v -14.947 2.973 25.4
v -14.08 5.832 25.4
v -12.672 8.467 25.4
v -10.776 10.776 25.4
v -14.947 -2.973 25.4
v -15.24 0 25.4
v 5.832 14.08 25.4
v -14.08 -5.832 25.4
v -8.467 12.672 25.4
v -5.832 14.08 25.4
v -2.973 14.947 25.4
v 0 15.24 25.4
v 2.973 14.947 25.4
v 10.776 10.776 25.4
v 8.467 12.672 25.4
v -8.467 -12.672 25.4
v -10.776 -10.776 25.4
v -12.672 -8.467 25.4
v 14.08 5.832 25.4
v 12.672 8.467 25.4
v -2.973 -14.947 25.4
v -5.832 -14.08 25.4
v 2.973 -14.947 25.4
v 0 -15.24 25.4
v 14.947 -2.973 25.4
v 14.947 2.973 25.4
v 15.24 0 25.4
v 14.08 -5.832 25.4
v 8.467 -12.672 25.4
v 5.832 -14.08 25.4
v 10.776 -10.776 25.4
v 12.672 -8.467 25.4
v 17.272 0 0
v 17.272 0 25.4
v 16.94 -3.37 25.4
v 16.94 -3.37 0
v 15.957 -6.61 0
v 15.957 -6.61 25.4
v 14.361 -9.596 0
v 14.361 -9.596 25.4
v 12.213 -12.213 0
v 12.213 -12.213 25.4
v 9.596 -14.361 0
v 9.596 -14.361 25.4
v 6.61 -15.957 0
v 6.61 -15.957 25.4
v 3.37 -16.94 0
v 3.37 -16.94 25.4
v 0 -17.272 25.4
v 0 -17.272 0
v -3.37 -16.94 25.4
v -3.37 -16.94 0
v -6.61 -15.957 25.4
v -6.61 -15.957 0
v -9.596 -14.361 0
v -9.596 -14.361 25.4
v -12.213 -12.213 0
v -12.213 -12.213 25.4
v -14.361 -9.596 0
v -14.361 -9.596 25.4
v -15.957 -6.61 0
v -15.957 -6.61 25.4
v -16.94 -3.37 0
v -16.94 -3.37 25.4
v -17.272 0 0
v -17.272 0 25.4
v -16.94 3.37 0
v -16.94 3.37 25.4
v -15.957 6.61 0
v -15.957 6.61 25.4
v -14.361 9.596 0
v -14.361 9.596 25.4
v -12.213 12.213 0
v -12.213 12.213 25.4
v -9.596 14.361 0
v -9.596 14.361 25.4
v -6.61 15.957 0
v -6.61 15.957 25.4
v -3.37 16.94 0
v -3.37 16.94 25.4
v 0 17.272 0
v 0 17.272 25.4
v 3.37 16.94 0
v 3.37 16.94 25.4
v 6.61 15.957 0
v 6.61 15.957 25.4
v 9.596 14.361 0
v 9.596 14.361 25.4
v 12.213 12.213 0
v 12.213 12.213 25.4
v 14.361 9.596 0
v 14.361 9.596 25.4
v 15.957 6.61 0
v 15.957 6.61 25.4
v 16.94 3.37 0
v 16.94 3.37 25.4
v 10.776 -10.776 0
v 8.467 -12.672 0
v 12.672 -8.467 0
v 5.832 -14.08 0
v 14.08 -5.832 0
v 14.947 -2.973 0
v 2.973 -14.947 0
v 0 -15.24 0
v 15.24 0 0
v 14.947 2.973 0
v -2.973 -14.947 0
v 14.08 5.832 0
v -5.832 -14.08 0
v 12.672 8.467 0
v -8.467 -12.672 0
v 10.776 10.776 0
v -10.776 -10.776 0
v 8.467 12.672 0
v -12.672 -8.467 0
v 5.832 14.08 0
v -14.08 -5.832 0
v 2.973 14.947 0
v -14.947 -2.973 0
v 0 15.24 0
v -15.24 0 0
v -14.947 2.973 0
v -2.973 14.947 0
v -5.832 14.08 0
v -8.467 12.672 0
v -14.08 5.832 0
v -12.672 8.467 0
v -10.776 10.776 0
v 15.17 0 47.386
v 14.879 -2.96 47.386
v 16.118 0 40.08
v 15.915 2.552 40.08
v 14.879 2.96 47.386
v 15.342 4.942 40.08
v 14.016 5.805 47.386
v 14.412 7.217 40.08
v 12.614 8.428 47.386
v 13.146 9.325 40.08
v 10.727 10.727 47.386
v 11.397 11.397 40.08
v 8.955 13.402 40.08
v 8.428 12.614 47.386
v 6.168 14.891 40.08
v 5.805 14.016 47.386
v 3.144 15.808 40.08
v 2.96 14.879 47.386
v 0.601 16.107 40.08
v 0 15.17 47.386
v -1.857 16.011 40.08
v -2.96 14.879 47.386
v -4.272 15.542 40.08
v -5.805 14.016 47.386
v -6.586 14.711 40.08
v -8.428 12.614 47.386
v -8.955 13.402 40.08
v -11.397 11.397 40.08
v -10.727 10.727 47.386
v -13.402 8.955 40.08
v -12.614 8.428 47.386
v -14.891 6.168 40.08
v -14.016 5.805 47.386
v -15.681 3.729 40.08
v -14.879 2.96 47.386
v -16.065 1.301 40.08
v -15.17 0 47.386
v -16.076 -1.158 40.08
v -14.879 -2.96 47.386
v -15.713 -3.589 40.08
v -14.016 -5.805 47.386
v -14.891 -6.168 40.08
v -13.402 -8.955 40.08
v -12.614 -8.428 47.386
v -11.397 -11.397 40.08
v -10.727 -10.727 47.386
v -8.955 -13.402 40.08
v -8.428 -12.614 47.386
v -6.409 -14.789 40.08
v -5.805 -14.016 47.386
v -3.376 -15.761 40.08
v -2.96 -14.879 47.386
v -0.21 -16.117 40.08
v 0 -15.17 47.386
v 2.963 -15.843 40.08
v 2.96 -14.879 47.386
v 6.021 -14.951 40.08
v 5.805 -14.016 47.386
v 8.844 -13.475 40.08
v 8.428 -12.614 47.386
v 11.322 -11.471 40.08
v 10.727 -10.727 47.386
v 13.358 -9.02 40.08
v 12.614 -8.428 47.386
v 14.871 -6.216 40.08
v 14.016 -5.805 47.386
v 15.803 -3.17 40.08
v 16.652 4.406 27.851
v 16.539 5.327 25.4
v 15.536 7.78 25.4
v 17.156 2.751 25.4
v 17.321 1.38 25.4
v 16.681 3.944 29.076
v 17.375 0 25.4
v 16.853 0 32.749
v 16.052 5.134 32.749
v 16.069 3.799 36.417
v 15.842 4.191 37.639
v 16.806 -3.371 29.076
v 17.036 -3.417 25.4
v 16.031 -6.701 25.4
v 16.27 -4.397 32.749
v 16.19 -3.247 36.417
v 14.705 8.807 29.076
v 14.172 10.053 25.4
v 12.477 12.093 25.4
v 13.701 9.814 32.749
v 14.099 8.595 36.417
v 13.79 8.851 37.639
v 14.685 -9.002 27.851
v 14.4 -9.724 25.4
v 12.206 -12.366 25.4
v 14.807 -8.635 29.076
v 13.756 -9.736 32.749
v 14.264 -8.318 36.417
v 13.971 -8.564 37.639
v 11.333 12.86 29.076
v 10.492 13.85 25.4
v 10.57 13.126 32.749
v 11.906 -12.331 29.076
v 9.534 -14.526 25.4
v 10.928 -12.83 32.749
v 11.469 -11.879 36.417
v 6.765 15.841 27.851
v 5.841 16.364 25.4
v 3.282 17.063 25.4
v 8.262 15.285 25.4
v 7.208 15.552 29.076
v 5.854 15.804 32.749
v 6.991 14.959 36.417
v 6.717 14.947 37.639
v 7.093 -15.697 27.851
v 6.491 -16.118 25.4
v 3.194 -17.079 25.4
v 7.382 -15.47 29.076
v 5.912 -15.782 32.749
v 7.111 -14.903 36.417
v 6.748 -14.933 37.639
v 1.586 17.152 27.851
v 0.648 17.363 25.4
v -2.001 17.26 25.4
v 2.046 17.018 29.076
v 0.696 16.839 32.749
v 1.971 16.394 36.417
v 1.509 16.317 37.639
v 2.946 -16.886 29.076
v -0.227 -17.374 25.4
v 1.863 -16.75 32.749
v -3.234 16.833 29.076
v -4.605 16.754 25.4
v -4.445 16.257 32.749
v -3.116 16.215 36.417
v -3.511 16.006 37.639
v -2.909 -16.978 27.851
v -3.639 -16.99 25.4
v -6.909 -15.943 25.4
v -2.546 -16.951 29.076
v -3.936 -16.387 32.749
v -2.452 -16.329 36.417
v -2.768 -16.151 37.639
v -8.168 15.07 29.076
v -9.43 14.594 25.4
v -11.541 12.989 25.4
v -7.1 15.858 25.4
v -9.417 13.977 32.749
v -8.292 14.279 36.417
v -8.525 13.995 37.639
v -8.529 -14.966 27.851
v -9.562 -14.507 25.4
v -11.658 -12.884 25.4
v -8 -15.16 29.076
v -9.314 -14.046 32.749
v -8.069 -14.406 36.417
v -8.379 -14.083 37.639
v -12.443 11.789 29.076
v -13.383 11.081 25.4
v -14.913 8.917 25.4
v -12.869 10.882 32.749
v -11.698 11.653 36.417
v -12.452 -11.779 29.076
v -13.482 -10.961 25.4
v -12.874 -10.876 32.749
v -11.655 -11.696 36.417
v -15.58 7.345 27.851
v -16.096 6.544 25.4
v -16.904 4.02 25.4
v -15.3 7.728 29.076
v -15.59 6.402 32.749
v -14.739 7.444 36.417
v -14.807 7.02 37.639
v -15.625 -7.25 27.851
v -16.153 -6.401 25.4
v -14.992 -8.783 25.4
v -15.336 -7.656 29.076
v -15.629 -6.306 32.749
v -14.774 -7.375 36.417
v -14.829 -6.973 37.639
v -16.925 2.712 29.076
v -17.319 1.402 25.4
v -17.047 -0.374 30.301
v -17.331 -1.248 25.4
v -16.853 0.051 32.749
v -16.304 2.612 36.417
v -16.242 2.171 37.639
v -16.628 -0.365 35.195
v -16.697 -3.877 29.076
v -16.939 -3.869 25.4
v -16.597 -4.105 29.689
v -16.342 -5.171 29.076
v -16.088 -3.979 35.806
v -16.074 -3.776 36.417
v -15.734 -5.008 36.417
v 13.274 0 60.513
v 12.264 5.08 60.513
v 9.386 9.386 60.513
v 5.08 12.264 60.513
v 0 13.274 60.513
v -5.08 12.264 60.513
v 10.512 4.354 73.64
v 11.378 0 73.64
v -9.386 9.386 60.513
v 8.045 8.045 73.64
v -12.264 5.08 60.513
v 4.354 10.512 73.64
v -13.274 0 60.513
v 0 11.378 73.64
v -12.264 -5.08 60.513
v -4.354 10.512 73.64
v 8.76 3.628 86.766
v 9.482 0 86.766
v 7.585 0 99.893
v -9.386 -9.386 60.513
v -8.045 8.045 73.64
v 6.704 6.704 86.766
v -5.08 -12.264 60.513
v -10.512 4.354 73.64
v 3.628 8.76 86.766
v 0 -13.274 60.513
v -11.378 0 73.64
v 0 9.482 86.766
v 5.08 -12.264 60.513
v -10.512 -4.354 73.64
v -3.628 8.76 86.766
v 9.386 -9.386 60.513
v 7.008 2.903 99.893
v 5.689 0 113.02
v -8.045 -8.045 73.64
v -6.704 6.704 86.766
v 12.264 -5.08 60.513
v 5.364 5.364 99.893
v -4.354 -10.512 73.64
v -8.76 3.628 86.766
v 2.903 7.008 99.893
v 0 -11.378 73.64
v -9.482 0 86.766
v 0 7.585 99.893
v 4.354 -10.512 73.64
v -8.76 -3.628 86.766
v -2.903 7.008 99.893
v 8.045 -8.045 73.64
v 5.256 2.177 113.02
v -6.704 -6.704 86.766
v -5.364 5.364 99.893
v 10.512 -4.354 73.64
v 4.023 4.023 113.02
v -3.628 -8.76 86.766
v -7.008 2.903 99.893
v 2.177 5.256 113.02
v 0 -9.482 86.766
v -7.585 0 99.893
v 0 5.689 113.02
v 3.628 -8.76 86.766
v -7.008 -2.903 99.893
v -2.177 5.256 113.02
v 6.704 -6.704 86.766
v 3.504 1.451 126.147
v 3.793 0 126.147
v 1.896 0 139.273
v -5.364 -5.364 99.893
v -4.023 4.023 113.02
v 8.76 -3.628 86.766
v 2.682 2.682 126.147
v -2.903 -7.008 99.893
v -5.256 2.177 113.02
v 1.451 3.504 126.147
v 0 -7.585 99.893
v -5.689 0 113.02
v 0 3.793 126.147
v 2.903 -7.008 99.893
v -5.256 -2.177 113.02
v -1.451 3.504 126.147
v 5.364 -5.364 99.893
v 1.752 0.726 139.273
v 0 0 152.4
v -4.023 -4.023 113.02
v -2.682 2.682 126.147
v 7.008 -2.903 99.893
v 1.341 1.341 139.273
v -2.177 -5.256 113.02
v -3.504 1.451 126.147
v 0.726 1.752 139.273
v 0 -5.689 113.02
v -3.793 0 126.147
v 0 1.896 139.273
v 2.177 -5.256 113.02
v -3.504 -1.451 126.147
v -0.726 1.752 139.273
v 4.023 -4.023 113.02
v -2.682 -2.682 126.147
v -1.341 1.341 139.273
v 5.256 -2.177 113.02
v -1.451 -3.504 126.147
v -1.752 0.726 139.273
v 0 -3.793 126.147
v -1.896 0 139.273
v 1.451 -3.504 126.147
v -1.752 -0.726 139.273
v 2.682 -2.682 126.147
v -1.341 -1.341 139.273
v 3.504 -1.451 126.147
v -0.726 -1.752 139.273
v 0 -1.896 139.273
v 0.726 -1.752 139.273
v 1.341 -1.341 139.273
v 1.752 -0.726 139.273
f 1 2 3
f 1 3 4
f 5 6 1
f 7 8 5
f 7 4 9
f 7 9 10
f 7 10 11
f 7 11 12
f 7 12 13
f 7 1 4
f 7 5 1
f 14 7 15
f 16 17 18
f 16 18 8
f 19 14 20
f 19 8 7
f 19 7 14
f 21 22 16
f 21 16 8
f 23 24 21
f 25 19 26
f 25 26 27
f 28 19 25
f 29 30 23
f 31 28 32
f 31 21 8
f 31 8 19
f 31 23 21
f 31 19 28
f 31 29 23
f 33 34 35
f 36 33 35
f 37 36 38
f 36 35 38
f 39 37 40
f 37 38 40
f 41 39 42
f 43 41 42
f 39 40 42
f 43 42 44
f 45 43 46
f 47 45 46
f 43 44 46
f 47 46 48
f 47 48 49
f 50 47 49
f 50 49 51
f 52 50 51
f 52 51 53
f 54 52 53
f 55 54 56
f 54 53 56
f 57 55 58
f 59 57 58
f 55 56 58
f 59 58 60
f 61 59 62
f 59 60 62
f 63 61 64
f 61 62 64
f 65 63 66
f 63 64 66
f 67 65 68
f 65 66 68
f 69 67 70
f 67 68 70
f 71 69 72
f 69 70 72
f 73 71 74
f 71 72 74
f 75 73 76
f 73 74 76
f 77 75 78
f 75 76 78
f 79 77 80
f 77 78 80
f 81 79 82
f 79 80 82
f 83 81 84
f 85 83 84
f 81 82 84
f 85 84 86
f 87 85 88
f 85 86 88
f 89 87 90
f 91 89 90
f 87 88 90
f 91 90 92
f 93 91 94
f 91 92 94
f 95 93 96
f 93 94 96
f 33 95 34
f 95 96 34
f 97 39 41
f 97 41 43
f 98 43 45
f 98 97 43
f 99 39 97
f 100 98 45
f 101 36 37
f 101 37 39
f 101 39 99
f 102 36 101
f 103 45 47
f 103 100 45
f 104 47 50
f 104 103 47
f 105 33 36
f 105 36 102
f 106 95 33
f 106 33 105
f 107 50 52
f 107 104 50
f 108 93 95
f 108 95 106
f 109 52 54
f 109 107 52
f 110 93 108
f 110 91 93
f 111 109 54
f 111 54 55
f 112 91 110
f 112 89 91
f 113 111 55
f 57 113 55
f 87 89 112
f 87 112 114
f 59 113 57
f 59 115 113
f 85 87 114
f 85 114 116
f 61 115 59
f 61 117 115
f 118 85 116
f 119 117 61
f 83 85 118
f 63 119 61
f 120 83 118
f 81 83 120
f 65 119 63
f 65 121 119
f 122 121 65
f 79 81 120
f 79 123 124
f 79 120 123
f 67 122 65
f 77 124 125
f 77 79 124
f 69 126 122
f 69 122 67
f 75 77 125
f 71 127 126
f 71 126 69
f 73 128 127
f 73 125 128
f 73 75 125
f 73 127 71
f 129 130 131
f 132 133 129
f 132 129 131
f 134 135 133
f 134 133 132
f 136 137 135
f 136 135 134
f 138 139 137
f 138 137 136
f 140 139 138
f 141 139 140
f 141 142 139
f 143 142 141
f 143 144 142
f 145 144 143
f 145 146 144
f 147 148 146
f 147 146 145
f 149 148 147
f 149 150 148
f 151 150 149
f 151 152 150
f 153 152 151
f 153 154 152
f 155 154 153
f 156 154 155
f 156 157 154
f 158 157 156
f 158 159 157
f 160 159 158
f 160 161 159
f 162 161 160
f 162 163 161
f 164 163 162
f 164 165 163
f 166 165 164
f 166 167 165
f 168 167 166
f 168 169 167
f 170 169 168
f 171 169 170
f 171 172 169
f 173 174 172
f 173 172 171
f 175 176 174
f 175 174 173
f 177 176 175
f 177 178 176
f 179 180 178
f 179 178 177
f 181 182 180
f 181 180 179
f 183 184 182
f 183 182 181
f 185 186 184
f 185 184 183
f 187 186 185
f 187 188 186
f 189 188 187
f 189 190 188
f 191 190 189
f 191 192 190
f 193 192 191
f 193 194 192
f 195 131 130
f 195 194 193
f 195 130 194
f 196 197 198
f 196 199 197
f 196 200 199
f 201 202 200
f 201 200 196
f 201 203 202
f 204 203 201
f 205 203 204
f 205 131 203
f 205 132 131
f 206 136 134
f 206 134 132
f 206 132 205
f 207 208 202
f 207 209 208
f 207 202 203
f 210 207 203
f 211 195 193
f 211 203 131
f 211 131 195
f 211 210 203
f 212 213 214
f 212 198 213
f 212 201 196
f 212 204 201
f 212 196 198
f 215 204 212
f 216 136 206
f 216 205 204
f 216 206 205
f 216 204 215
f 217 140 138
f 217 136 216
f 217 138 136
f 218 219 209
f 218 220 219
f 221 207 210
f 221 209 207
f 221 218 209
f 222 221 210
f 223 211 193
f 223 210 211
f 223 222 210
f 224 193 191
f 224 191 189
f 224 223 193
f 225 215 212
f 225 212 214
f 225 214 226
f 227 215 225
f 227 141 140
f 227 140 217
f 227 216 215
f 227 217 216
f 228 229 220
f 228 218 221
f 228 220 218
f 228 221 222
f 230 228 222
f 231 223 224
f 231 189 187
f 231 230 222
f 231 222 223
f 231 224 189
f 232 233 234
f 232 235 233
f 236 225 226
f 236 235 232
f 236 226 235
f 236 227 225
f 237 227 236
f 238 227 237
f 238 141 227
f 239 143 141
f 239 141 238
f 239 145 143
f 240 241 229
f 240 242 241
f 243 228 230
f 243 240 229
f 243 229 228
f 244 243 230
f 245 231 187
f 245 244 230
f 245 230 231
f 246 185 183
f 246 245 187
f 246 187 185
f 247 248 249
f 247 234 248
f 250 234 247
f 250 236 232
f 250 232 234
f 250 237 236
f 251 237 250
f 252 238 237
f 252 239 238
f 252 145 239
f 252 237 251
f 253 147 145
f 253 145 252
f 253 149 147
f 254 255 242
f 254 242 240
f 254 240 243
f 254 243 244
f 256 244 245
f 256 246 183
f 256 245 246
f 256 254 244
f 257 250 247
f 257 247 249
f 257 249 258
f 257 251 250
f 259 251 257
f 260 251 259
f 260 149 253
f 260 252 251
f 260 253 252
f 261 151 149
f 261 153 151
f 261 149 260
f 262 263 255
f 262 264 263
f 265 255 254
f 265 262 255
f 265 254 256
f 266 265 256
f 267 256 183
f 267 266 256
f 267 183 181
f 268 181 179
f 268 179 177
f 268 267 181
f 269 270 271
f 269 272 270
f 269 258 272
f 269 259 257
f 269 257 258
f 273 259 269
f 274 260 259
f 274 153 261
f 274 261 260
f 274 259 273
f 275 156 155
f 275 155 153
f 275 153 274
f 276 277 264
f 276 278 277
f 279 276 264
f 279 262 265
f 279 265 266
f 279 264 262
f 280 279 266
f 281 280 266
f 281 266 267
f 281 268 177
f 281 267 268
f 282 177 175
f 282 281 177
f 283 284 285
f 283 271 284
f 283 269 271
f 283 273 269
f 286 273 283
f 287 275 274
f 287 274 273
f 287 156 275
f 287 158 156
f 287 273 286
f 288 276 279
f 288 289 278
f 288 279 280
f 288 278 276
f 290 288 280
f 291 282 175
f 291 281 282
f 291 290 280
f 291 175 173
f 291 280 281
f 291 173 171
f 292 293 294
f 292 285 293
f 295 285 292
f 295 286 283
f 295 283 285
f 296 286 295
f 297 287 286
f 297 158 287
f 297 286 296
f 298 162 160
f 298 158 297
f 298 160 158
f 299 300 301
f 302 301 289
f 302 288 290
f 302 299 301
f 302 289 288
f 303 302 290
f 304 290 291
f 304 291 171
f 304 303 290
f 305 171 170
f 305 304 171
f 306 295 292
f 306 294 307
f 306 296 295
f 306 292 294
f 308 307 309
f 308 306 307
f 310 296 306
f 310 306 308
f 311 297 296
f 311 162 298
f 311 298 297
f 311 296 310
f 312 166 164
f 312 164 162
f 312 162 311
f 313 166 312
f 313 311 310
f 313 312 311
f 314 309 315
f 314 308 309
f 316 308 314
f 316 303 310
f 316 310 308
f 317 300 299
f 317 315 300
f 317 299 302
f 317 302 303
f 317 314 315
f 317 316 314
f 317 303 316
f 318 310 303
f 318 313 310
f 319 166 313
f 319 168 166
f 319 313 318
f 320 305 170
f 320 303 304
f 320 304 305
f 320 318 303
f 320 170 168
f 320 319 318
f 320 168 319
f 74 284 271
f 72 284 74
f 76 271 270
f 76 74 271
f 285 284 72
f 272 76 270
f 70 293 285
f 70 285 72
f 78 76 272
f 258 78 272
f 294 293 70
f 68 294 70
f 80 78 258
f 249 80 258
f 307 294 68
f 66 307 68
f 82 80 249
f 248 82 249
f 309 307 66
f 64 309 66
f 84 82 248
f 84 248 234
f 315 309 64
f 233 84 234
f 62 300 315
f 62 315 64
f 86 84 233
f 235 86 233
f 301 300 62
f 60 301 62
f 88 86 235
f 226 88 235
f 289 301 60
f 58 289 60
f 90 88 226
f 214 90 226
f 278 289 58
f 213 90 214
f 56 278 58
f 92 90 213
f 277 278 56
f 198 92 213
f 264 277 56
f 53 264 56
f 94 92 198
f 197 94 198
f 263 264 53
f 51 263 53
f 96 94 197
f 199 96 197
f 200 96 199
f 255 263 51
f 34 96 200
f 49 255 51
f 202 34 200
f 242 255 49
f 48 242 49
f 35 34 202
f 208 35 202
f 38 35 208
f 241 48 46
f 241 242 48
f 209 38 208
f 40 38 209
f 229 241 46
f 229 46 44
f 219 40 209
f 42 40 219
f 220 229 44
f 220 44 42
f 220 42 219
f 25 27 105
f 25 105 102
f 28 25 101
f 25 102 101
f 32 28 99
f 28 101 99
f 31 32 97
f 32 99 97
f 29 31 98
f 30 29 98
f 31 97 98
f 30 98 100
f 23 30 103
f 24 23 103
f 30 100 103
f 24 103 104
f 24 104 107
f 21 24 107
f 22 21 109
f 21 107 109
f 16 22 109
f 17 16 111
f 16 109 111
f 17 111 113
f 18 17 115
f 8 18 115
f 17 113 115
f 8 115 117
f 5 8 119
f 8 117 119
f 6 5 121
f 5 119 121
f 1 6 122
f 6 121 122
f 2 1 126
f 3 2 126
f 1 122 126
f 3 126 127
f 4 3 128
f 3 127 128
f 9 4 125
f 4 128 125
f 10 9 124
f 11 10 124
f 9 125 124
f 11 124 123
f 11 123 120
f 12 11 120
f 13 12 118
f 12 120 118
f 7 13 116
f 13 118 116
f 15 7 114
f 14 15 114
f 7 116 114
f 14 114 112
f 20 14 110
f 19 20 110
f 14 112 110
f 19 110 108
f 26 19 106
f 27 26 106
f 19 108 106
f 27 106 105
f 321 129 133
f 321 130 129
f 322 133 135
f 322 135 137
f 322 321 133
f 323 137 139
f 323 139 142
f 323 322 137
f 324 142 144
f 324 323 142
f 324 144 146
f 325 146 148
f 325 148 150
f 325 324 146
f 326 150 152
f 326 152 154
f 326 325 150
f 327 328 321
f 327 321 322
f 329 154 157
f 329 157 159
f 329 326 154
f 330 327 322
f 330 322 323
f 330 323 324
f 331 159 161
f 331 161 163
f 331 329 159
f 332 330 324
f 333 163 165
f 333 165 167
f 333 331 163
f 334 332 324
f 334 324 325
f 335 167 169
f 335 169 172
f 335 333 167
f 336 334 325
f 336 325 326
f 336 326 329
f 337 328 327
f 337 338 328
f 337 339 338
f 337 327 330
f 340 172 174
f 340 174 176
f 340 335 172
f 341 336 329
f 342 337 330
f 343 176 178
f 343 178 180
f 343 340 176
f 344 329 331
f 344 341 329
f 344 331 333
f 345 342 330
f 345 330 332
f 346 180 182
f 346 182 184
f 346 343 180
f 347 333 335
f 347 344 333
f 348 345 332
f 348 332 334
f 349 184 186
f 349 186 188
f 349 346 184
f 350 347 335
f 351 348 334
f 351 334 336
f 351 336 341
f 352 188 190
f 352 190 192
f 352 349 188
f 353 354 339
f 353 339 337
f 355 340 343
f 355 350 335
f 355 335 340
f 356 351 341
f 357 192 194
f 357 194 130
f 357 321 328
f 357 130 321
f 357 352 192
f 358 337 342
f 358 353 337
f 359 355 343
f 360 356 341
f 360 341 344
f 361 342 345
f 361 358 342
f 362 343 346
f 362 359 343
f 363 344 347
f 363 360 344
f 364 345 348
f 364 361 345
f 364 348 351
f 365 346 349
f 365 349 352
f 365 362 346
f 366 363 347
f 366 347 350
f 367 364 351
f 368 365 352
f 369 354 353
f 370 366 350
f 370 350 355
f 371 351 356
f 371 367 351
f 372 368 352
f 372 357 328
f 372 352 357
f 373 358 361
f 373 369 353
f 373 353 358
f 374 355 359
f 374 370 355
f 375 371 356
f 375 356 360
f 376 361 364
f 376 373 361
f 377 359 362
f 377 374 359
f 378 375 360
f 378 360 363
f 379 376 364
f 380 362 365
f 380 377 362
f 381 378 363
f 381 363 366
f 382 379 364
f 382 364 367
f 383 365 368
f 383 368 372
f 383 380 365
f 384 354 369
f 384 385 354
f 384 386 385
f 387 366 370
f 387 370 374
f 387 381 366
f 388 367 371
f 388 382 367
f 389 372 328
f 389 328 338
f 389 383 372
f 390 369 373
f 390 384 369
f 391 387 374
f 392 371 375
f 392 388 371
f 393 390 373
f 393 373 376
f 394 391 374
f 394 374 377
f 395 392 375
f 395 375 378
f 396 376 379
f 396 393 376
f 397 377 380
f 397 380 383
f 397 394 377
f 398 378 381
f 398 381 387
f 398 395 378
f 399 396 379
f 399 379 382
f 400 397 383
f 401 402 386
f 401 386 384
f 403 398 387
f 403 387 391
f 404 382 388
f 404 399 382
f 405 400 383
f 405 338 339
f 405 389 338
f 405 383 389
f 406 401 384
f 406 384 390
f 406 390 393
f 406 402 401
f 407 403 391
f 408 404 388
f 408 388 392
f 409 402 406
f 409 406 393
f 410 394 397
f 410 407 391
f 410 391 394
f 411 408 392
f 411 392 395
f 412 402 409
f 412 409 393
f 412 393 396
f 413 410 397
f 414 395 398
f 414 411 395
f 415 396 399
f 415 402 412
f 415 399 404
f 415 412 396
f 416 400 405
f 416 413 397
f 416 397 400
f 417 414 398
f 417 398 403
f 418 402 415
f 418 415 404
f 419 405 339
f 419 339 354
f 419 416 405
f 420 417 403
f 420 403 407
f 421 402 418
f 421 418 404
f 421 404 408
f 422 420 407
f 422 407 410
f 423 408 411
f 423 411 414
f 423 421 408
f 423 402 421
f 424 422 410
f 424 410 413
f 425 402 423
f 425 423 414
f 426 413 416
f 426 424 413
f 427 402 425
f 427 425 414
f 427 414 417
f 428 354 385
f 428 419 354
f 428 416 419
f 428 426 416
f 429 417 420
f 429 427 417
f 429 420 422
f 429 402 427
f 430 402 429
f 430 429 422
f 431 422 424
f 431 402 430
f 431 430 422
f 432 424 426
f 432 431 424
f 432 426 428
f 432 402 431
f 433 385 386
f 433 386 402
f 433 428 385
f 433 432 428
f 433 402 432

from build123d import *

# Parameters (mm, degrees)
F2_R     = 15.24
F3_DEPTH = 25.4
F4_R     = 17.78
F4_R_2   = 17.272
F5_DEPTH = 25.4


with BuildPart() as f1:
    # F0 (on Front) → F1 (revolve)
    with BuildSketch(Plane.XZ):
        with BuildLine():
            Line((0, 0), (17.78, 0))
            Line((17.78, 0), (17.78, 11.070003))
            ThreePointArc((17.78, 11.070003), (17.126763, 29.27488), (15.170413, 47.38612))
            Line((15.170413, 47.38612), (0, 152.4))
            Line((0, 152.4), (0, 0))
        make_face()
    revolve(axis=Axis((0, 0, 88.9), (0, 0, 1)))

    # F2 (on face) → F3 (cut)
    with BuildSketch(Plane(origin=(0, 0, 0), x_dir=(1, 0, 0), z_dir=(0, 0, -1))):
        Circle(F2_R)
    extrude(amount=-F3_DEPTH, mode=Mode.SUBTRACT)

    # F4 (on face) → F5 (cut)
    with BuildSketch(Plane(origin=(0, 0, 25.4), x_dir=(1, 0, 0), z_dir=(0, 0, -1))):
        Circle(F4_R)
        Circle(F4_R_2, mode=Mode.SUBTRACT)
    extrude(amount=F5_DEPTH, mode=Mode.SUBTRACT)


solid = f1.part
